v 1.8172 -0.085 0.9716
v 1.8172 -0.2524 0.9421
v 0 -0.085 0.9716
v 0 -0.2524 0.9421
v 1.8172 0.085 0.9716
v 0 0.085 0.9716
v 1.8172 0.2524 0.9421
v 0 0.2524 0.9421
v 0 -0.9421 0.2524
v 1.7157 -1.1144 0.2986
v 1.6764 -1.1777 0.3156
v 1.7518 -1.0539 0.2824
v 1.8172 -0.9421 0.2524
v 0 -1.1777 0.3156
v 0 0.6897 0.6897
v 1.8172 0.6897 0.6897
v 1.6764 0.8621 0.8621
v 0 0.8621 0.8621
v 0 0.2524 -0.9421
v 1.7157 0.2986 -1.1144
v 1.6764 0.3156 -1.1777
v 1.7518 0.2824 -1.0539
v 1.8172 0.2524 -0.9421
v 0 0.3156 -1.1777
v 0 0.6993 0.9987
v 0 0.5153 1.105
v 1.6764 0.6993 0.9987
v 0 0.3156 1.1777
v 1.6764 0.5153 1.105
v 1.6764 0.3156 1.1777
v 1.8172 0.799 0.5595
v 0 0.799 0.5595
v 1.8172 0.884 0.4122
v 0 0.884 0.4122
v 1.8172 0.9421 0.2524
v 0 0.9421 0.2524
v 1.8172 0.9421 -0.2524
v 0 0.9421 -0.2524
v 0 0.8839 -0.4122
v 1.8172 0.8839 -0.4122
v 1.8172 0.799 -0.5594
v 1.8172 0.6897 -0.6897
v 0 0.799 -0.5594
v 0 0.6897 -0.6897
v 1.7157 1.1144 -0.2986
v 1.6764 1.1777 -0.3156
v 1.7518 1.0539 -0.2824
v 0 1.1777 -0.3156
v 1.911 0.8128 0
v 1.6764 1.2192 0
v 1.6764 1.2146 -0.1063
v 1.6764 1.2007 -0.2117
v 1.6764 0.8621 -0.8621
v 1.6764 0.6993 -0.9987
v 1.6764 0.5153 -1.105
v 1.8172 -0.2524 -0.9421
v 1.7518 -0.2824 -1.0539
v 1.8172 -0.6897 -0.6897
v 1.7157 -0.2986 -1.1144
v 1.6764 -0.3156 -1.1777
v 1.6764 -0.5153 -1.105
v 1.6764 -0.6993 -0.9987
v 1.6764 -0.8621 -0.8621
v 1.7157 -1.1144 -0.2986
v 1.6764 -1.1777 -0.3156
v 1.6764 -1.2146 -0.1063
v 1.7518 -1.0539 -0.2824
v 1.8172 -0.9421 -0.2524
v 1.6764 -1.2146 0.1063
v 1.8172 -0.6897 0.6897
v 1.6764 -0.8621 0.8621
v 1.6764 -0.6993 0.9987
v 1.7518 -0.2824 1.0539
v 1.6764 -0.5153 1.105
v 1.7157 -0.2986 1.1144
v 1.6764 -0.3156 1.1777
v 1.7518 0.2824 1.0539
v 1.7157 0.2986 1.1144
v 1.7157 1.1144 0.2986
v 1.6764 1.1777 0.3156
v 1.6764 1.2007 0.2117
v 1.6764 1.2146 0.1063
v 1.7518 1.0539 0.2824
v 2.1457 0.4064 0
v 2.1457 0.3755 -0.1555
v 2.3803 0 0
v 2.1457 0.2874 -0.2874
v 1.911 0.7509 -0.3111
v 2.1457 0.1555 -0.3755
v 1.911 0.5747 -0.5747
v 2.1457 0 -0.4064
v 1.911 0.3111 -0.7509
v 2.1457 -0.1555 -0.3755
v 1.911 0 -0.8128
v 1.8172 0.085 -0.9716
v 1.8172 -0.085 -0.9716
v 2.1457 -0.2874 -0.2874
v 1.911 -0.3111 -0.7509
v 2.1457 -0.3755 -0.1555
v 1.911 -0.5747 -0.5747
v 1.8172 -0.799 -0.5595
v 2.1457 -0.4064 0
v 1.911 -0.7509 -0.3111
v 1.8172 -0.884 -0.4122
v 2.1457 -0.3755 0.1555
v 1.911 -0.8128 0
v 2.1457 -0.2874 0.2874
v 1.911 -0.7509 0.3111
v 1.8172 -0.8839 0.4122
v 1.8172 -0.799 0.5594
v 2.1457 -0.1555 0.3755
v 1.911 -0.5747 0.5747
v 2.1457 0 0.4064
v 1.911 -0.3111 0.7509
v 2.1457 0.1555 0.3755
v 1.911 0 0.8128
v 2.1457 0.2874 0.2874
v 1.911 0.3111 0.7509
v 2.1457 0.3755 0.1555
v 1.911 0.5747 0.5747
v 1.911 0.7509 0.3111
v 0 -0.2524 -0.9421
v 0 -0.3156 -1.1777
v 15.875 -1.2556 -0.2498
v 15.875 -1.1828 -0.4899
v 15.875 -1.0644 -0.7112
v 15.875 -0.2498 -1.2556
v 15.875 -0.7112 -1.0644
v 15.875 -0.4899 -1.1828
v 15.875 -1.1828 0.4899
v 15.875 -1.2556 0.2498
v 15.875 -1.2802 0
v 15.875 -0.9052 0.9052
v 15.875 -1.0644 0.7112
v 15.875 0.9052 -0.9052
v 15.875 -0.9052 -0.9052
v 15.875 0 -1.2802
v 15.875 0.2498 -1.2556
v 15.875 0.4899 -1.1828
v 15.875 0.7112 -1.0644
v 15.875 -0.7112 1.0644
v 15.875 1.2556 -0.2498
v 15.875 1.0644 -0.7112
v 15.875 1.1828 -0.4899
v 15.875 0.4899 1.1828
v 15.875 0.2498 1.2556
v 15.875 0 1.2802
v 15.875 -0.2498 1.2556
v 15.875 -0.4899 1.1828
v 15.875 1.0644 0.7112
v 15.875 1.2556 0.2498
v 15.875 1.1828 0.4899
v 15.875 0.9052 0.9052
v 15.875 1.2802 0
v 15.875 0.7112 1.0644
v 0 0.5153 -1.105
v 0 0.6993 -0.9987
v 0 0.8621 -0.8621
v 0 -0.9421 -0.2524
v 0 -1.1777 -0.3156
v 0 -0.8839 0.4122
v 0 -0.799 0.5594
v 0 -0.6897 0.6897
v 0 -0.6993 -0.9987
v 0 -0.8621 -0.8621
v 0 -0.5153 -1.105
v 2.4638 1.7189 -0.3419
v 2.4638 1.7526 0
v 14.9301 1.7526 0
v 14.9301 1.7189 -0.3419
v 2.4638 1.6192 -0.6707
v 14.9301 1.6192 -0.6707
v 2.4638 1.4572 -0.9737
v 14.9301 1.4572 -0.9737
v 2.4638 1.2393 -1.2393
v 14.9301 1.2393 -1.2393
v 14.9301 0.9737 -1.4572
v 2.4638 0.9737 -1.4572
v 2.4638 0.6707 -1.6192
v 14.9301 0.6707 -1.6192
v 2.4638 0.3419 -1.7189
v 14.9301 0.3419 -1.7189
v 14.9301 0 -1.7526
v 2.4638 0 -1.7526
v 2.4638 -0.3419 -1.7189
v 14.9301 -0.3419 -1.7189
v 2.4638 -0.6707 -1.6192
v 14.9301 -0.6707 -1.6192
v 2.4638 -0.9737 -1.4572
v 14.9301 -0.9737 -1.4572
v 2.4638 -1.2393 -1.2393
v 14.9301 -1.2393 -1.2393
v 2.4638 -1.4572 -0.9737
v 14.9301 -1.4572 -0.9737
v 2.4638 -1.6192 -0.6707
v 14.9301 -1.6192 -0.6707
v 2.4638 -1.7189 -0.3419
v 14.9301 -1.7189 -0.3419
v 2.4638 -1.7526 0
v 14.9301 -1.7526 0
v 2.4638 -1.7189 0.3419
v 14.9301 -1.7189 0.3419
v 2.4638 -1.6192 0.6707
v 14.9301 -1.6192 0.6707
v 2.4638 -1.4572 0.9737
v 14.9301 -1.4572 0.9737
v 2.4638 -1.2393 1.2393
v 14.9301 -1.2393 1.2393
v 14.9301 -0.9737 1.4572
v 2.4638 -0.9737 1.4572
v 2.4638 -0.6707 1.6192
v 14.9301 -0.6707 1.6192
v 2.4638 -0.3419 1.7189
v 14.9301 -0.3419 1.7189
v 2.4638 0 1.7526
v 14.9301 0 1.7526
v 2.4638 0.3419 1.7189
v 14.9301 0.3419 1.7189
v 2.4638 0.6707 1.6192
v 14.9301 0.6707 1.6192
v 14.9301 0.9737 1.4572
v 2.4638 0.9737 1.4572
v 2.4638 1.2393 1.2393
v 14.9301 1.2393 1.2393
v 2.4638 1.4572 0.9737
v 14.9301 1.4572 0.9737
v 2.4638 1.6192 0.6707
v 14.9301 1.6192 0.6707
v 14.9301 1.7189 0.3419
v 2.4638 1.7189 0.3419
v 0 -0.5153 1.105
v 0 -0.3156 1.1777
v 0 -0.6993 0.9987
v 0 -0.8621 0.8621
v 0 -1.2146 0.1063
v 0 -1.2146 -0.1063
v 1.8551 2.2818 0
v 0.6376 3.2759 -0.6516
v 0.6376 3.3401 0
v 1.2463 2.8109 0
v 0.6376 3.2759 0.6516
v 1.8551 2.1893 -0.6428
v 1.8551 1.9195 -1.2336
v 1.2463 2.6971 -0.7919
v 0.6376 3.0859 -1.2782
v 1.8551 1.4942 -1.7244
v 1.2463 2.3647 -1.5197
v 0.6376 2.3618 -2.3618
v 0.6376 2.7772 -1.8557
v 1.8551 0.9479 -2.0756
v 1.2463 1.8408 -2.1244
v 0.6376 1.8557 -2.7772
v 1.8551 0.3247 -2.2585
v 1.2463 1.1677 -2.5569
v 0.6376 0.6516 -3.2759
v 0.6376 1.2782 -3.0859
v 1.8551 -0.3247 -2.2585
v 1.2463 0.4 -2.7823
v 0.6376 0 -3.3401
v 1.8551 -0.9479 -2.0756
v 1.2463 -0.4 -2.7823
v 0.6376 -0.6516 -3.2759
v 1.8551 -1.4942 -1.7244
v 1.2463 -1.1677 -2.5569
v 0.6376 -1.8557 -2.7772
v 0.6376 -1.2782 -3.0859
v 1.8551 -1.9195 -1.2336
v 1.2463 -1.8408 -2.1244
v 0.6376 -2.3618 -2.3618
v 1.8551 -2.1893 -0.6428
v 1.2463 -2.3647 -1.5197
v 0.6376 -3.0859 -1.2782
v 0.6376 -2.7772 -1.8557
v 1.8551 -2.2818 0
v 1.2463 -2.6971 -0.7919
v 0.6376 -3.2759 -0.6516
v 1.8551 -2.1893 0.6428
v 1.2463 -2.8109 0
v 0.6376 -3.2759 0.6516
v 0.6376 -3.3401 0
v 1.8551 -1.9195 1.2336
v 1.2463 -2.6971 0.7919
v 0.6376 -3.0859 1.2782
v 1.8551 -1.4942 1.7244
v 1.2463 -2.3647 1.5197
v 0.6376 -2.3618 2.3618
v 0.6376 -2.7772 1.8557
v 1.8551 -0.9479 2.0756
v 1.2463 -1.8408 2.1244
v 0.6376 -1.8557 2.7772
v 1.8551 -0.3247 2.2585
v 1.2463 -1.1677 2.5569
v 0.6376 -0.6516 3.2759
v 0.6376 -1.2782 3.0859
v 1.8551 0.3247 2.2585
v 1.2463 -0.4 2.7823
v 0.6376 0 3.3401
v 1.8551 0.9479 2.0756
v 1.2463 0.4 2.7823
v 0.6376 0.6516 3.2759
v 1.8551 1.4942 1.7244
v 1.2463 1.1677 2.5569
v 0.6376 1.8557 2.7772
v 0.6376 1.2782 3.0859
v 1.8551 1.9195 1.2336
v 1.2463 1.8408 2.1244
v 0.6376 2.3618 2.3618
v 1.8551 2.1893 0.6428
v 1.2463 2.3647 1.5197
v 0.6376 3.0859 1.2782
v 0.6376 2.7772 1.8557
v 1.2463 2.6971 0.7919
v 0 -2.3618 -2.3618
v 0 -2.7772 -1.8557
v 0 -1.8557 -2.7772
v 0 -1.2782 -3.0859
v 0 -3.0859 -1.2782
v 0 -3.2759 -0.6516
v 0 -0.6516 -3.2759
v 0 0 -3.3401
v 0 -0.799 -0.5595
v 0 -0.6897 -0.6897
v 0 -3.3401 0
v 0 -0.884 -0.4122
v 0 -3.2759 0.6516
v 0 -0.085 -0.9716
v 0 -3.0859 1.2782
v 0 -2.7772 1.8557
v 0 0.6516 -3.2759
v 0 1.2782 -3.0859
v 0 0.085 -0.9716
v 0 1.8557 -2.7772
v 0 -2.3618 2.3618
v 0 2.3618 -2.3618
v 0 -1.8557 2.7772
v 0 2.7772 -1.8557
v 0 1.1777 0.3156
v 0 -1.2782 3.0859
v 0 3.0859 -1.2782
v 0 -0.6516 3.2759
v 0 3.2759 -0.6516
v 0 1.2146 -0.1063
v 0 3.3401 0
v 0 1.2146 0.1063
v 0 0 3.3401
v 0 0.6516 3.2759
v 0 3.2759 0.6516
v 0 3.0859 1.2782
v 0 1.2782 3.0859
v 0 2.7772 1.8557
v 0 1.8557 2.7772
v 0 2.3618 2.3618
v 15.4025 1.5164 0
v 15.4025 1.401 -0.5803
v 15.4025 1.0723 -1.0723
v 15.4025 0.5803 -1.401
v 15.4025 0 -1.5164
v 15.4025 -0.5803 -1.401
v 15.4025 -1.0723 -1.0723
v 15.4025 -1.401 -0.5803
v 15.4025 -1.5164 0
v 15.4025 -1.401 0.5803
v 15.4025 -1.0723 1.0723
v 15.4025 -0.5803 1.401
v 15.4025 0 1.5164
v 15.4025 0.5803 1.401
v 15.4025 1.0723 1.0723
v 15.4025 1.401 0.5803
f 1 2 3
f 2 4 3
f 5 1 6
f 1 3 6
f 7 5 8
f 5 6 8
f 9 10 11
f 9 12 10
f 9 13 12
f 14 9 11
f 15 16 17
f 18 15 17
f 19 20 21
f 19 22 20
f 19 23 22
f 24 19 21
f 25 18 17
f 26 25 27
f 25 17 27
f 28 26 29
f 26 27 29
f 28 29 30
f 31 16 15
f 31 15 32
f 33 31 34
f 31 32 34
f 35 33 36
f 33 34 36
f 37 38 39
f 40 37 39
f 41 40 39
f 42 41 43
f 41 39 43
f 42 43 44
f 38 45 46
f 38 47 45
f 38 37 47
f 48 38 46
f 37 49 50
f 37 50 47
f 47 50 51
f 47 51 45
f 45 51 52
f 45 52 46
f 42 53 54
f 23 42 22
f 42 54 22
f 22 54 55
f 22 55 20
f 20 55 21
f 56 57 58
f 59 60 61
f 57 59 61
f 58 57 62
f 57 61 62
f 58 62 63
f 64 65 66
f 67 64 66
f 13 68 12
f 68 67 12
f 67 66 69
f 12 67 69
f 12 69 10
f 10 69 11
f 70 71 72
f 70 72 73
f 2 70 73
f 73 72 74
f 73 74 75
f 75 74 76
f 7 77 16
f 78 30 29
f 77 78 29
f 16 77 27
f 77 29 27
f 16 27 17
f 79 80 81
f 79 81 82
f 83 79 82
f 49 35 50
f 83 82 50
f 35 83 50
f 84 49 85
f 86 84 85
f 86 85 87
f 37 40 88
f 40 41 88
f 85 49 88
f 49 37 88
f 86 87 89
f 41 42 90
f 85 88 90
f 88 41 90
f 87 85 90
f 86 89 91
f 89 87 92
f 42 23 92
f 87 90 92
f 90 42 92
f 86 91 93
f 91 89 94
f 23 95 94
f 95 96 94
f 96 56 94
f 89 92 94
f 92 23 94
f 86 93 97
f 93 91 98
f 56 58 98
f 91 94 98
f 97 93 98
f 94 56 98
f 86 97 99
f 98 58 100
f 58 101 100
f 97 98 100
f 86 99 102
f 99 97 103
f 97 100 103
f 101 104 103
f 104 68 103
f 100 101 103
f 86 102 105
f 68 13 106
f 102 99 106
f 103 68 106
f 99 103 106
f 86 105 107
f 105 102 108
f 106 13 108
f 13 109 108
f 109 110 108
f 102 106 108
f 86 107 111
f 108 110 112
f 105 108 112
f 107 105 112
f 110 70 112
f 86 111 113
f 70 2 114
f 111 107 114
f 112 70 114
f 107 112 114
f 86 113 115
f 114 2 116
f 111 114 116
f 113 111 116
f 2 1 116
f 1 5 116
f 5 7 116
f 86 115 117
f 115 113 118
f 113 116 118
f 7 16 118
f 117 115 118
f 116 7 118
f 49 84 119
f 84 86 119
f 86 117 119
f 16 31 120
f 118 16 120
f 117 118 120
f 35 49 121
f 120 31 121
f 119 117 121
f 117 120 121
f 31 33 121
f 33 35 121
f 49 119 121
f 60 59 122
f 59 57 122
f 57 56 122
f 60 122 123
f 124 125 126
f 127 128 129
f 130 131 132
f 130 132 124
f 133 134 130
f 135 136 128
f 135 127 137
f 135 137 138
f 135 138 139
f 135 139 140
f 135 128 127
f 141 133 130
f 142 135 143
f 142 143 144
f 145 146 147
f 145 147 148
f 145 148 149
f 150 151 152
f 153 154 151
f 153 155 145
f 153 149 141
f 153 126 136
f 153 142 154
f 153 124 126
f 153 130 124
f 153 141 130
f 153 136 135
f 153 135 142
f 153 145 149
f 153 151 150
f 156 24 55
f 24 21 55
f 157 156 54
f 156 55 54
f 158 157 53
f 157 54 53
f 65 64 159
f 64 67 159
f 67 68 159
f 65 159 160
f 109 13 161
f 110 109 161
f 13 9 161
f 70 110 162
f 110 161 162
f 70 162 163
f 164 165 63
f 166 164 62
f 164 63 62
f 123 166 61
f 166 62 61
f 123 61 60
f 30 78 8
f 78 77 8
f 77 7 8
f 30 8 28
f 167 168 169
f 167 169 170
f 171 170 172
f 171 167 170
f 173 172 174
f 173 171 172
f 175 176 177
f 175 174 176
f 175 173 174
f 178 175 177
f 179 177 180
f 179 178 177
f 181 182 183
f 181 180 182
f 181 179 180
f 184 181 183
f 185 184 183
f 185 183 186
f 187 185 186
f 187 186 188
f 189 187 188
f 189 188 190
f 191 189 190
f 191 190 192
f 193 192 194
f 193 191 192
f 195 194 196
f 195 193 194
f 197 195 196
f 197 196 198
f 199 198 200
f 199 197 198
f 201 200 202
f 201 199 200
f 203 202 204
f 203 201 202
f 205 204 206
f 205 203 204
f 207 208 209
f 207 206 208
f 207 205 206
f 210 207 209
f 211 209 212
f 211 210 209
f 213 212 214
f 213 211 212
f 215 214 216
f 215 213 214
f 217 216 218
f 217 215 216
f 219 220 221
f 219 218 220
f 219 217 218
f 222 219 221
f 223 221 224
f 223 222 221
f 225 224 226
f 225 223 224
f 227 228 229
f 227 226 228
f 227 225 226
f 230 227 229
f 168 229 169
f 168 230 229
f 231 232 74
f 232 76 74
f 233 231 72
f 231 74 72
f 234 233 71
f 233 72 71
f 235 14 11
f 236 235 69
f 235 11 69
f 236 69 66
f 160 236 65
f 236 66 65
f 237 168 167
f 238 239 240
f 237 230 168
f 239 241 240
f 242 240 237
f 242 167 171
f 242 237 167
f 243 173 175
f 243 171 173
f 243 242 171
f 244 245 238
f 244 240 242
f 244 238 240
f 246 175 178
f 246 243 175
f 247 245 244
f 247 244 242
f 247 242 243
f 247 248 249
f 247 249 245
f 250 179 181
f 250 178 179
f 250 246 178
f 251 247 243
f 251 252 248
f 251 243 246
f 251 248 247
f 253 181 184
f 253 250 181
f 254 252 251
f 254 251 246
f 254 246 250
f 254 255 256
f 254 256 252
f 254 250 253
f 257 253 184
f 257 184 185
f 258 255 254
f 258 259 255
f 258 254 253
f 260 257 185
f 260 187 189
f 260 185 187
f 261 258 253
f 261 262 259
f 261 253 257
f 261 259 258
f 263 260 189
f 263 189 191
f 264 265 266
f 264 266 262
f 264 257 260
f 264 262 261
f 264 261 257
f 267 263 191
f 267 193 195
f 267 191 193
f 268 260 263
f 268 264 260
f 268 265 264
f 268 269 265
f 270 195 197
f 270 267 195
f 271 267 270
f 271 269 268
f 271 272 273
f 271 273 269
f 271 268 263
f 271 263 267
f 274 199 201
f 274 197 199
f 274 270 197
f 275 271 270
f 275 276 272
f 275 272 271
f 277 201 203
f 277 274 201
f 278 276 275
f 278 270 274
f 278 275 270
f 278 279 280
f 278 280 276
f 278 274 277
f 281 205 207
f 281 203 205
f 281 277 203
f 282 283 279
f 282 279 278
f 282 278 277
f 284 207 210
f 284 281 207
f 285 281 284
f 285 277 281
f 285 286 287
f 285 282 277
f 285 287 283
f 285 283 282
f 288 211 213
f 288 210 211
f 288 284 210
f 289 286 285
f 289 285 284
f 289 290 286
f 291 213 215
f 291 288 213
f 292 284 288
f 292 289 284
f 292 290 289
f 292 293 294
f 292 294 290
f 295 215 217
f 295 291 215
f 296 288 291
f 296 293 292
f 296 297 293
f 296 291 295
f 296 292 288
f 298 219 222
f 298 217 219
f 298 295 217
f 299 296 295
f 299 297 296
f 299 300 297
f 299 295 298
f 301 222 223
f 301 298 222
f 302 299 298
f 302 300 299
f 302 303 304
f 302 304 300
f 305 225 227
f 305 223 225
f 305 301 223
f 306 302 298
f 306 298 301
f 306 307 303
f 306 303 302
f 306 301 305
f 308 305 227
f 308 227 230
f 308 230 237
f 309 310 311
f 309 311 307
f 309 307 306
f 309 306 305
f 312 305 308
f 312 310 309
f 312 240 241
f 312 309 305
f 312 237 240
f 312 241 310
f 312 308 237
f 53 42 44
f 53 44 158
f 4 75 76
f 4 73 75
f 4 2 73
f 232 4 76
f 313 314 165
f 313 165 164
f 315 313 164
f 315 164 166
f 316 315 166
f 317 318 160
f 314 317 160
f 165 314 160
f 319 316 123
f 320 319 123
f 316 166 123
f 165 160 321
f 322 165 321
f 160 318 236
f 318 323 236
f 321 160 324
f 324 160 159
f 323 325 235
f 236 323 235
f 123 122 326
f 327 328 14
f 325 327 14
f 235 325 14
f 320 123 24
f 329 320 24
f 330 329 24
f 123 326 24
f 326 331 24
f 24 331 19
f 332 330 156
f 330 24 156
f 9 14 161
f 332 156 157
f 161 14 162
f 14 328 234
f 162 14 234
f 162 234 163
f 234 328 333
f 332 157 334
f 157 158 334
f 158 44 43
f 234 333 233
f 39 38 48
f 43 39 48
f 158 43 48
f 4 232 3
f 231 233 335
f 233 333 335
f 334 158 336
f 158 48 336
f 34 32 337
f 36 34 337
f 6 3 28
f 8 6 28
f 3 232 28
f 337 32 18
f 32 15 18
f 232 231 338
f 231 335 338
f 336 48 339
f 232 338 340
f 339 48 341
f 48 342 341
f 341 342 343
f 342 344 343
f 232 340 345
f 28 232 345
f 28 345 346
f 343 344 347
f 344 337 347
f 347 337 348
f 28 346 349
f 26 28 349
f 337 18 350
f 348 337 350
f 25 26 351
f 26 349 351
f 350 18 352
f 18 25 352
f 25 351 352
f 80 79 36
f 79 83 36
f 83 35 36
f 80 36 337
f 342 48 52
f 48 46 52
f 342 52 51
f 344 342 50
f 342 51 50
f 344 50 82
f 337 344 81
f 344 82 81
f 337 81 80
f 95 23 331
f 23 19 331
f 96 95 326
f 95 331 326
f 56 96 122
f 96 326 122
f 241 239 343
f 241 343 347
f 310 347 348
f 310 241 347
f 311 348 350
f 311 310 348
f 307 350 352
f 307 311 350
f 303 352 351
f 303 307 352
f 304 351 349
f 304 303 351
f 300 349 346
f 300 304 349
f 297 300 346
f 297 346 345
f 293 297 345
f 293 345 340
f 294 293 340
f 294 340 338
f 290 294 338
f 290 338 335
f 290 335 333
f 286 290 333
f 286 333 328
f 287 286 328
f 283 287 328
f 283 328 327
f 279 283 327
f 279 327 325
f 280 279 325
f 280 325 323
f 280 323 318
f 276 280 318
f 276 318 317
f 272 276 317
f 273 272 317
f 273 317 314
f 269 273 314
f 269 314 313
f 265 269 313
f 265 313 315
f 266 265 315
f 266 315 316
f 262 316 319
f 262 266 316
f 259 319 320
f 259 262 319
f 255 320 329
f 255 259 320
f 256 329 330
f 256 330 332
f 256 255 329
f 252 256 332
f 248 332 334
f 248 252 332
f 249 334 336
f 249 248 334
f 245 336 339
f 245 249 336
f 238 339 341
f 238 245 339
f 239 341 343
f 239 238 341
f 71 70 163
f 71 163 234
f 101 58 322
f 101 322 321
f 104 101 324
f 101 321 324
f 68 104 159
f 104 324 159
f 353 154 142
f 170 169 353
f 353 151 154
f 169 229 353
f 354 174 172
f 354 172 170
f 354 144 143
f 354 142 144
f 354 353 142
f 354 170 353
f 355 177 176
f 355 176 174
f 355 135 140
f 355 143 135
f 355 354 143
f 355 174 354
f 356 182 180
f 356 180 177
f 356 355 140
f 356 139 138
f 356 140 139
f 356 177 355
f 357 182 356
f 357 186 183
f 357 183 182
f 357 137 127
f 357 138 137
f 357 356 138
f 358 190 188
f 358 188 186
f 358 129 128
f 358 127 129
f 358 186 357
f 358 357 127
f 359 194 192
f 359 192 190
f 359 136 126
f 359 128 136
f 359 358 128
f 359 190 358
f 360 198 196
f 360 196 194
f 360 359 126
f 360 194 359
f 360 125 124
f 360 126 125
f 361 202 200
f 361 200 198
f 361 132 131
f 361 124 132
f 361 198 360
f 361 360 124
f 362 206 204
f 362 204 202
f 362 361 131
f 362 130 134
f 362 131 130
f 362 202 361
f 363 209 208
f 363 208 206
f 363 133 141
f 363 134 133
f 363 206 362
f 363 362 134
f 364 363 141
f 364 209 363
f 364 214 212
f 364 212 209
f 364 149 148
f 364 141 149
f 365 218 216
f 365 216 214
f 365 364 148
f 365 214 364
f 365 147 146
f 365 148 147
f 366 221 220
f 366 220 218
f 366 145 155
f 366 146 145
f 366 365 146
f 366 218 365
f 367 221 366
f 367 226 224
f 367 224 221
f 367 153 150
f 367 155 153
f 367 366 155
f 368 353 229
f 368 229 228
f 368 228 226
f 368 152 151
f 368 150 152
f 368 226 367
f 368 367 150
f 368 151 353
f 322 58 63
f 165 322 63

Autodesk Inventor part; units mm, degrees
ref_plane "YZ Plane" through (0, 0, 0) normal (1, 0, 0) x (0, 1, 0)
ref_plane "XZ Plane" through (0, 0, 0) normal (0, 1, 0) x (-1, 0, 0)
sketch "Sketch1" plane through (0, 0, 0) normal (0, 0, 1) x (1, 0, 0)
  line L0 (15.875, 0) -> (15.875, 1.7526)
  line L1 (15.875, 1.7526) -> (2.4638, 1.7526)
  line L2 (0, 3.3401) -> (0, 1.2192)
  line L3 (0, 1.2192) -> (1.6764, 1.2192)
  line L4 (1.6764, 1.2192) -> (2.3803, 0)
  line L5 (2.3803, 0) -> (15.875, 0)
  line L6 (0, 3.3401) -> (0.6376, 3.3401)
  line L7 (0.6376, 3.3401) -> (2.4638, 1.7526)
  line L8 (-3.175, 0) -> (19.05, 0) projected
  line L9 (0, -0.668) -> (0, 4.0081) projected
  dimension "d0" = 15.875
  dimension "d1" = 1.6764
  dimension "d2" = 3.5052
  dimension "d3" = 2.4638
  dimension "d4" = 41
  dimension "d5" = 2.4384
  dimension "d6" = 60
  dimension "d7" = 6.6802
revolve "Body" add sketch "Sketch1" angle 360 about axis through (2.3803, 0, 0) along (1, 0, 0) contours L5 L4 L3 L2 L6 L7 L1 L0
sketch "Sketch2" plane through (0, 0, 0) normal (-1, 0, 0) x (0, 0, 1)
  circle A0 centre (0, 0) radius 3.3401 projected
  circle A1 centre (0, 0) radius 1.2192 projected
  line L0 (0.9421, 0.2524) -> (1.1777, 0.3156)
  line L1 (0.9421, -0.2524) -> (1.1777, -0.3156)
  arc A2 (0.9421, -0.2524) -> (0.9421, 0.2524) centre (0, 0) ccw
  arc A3 (1.1777, -0.3156) -> (1.1777, 0.3156) centre (0, 0) ccw
  line L2 (0, -4.6761) -> (0, 4.6761) projected
  line L3 (-4.6761, 0) -> (4.6761, 0) projected
  line L4 (0.9421, 0.2524) -> (0, 0) construction
  line L5 (0, 0) -> (0.9421, -0.2524) construction
  line L6 (0.2524, 0.9421) -> (0.3156, 1.1777)
  line L7 (0.6897, 0.6897) -> (0.8621, 0.8621)
  arc A4 (0.6897, 0.6897) -> (0.2524, 0.9421) centre (0, 0) ccw
  arc A5 (0.8621, 0.8621) -> (0.3156, 1.1777) centre (0, 0) ccw
  line L8 (-0.6897, 0.6897) -> (-0.8621, 0.8621)
  line L9 (-0.2524, 0.9421) -> (-0.3156, 1.1777)
  arc A6 (-0.2524, 0.9421) -> (-0.6897, 0.6897) centre (0, 0) ccw
  arc A7 (-0.3156, 1.1777) -> (-0.8621, 0.8621) centre (0, 0) ccw
  line L10 (-0.9421, -0.2524) -> (-1.1777, -0.3156)
  line L11 (-0.9421, 0.2524) -> (-1.1777, 0.3156)
  arc A8 (-0.9421, 0.2524) -> (-0.9421, -0.2524) centre (0, 0) ccw
  arc A9 (-1.1777, 0.3156) -> (-1.1777, -0.3156) centre (0, 0) ccw
  line L12 (-0.2524, -0.9421) -> (-0.3156, -1.1777)
  line L13 (-0.6897, -0.6897) -> (-0.8621, -0.8621)
  arc A10 (-0.6897, -0.6897) -> (-0.2524, -0.9421) centre (0, 0) ccw
  arc A11 (-0.8621, -0.8621) -> (-0.3156, -1.1777) centre (0, 0) ccw
  line L14 (0.6897, -0.6897) -> (0.8621, -0.8621)
  line L15 (0.2524, -0.9421) -> (0.3156, -1.1777)
  arc A12 (0.2524, -0.9421) -> (0.6897, -0.6897) centre (0, 0) ccw
  arc A13 (0.3156, -1.1777) -> (0.8621, -0.8621) centre (0, 0) ccw
  dimension "d8" = 1.9507
  dimension "d9" = 2.4384
  dimension "d10" = 15
  dimension "d11" = 15
  dimension "d22" = 360
extrude "Slot" add sketch "Sketch2" against normal up to next contours L3 A2 L0 A1 | A1 L1 A2 L3 | L3 A8 L10 A1 | A1 L11 A8 L3 | A1 L7 A4 L6 | L9 A6 L8 A1 | A1 L13 A10 L12 | L15 A12 L14 A1
thread "Thread" size "6-32 UNC" class "2A" standard "ANSI Unified Screw Threads" length 11.427
chamfer "Chamfer1" distance 0.4724 distance2 0.9449 1 edges at (15.875, -1.7526, 0) measured on face at (15.875, -0.7696, -0.2093)
ref_plane "Work Plane1" through (66.6877, 0, 0) normal (0, 0, -1) x (1, 0, 0)
equation "\"d0\" = NLG"
equation "\"d1\" = INTI"
equation "\"d2\" = GD"
equation "\"d3\" = KOH"
equation "\"d4\" = 0.5 * SEWI"
equation "\"d5\" = SW"
equation "\"d7\" = KOD"
equation "\"d8\" = 0.8 * SW"
equation "\"d9\" = SW"
equation "\"d15\" = GEL"
equation "\"d17\" = -0.5 * SPD + 0.5 * GD"
equation "\"d18\" = GUL"
equation "\"NLG\" = 15.875"
equation "\"SW\" = 2.4384"
equation "\"INTI\" = 1.6764"
equation "\"GEL\" = 11.42695"
equation "\"KOH\" = 2.4638"
equation "\"KOD\" = 6.6802"
equation "\"GUL\" = 0.94488"
equation "\"SPD\" = 2.56032"
equation "\"GD\" = NND"
equation "\"SEWI\" = 82deg"
equation "\"TOA\" = 30deg"
equation "\"GD1\" = SPD"
equation "\"EPV\" = 4.4794"
equation "\"THREADDIA\" = 3.5052"
equation "\"BDM\" = NND"
equation "\"NND\" = 3.5052"
equation "\"GAL\" = 1.9845"
equation "\"E0\" = 1.155 * SW"
properties part number "ANSI B18.3 - 6-32 UNC x 0.625, SSFCHCSI" material "Steel, Mild"
